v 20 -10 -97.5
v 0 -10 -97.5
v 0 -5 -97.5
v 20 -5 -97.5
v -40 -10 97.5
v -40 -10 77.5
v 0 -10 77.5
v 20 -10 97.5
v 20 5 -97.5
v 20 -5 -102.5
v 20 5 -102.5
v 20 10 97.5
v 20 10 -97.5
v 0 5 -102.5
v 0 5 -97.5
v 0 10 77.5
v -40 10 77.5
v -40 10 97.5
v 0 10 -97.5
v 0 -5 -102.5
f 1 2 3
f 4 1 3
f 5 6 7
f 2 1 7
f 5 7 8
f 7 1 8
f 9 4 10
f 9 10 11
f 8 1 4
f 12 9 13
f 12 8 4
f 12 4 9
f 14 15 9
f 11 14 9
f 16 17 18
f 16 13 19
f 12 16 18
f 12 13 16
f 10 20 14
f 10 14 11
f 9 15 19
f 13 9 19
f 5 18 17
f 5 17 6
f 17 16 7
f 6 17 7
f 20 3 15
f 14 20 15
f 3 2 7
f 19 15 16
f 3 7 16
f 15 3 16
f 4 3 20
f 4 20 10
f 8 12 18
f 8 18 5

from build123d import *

# Parameters (mm, degrees)
F0_W     = 20
F0_H     = 195
F1_DEPTH = 20
F2_W     = 20
F2_H     = 10
F3_DEPTH = 5
F4_W     = 20
F4_H     = 20
F5_DEPTH = 40


with BuildPart() as f1:
    # F0 (on Right) → F1 (new body)
    with BuildSketch(Plane.YZ):
        Rectangle(F0_W, F0_H)
    extrude(amount=F1_DEPTH)

    # F2 (on face) → F3 (join)
    with BuildSketch(Plane(origin=(0, 0, -97.5), x_dir=(1, 0, 0), z_dir=(0, 0, -1))):
        with Locations((10, 0)):
            Rectangle(F2_W, F2_H)
    extrude(amount=F3_DEPTH)

    # F4 (on face) → F5 (join)
    with BuildSketch(Plane(origin=(0, 0, 0), x_dir=(0, -1, 0), z_dir=(-1, 0, 0))):
        with Locations((0, 87.5)):
            Rectangle(F4_W, F4_H)
    extrude(amount=F5_DEPTH)


solid = f1.part
